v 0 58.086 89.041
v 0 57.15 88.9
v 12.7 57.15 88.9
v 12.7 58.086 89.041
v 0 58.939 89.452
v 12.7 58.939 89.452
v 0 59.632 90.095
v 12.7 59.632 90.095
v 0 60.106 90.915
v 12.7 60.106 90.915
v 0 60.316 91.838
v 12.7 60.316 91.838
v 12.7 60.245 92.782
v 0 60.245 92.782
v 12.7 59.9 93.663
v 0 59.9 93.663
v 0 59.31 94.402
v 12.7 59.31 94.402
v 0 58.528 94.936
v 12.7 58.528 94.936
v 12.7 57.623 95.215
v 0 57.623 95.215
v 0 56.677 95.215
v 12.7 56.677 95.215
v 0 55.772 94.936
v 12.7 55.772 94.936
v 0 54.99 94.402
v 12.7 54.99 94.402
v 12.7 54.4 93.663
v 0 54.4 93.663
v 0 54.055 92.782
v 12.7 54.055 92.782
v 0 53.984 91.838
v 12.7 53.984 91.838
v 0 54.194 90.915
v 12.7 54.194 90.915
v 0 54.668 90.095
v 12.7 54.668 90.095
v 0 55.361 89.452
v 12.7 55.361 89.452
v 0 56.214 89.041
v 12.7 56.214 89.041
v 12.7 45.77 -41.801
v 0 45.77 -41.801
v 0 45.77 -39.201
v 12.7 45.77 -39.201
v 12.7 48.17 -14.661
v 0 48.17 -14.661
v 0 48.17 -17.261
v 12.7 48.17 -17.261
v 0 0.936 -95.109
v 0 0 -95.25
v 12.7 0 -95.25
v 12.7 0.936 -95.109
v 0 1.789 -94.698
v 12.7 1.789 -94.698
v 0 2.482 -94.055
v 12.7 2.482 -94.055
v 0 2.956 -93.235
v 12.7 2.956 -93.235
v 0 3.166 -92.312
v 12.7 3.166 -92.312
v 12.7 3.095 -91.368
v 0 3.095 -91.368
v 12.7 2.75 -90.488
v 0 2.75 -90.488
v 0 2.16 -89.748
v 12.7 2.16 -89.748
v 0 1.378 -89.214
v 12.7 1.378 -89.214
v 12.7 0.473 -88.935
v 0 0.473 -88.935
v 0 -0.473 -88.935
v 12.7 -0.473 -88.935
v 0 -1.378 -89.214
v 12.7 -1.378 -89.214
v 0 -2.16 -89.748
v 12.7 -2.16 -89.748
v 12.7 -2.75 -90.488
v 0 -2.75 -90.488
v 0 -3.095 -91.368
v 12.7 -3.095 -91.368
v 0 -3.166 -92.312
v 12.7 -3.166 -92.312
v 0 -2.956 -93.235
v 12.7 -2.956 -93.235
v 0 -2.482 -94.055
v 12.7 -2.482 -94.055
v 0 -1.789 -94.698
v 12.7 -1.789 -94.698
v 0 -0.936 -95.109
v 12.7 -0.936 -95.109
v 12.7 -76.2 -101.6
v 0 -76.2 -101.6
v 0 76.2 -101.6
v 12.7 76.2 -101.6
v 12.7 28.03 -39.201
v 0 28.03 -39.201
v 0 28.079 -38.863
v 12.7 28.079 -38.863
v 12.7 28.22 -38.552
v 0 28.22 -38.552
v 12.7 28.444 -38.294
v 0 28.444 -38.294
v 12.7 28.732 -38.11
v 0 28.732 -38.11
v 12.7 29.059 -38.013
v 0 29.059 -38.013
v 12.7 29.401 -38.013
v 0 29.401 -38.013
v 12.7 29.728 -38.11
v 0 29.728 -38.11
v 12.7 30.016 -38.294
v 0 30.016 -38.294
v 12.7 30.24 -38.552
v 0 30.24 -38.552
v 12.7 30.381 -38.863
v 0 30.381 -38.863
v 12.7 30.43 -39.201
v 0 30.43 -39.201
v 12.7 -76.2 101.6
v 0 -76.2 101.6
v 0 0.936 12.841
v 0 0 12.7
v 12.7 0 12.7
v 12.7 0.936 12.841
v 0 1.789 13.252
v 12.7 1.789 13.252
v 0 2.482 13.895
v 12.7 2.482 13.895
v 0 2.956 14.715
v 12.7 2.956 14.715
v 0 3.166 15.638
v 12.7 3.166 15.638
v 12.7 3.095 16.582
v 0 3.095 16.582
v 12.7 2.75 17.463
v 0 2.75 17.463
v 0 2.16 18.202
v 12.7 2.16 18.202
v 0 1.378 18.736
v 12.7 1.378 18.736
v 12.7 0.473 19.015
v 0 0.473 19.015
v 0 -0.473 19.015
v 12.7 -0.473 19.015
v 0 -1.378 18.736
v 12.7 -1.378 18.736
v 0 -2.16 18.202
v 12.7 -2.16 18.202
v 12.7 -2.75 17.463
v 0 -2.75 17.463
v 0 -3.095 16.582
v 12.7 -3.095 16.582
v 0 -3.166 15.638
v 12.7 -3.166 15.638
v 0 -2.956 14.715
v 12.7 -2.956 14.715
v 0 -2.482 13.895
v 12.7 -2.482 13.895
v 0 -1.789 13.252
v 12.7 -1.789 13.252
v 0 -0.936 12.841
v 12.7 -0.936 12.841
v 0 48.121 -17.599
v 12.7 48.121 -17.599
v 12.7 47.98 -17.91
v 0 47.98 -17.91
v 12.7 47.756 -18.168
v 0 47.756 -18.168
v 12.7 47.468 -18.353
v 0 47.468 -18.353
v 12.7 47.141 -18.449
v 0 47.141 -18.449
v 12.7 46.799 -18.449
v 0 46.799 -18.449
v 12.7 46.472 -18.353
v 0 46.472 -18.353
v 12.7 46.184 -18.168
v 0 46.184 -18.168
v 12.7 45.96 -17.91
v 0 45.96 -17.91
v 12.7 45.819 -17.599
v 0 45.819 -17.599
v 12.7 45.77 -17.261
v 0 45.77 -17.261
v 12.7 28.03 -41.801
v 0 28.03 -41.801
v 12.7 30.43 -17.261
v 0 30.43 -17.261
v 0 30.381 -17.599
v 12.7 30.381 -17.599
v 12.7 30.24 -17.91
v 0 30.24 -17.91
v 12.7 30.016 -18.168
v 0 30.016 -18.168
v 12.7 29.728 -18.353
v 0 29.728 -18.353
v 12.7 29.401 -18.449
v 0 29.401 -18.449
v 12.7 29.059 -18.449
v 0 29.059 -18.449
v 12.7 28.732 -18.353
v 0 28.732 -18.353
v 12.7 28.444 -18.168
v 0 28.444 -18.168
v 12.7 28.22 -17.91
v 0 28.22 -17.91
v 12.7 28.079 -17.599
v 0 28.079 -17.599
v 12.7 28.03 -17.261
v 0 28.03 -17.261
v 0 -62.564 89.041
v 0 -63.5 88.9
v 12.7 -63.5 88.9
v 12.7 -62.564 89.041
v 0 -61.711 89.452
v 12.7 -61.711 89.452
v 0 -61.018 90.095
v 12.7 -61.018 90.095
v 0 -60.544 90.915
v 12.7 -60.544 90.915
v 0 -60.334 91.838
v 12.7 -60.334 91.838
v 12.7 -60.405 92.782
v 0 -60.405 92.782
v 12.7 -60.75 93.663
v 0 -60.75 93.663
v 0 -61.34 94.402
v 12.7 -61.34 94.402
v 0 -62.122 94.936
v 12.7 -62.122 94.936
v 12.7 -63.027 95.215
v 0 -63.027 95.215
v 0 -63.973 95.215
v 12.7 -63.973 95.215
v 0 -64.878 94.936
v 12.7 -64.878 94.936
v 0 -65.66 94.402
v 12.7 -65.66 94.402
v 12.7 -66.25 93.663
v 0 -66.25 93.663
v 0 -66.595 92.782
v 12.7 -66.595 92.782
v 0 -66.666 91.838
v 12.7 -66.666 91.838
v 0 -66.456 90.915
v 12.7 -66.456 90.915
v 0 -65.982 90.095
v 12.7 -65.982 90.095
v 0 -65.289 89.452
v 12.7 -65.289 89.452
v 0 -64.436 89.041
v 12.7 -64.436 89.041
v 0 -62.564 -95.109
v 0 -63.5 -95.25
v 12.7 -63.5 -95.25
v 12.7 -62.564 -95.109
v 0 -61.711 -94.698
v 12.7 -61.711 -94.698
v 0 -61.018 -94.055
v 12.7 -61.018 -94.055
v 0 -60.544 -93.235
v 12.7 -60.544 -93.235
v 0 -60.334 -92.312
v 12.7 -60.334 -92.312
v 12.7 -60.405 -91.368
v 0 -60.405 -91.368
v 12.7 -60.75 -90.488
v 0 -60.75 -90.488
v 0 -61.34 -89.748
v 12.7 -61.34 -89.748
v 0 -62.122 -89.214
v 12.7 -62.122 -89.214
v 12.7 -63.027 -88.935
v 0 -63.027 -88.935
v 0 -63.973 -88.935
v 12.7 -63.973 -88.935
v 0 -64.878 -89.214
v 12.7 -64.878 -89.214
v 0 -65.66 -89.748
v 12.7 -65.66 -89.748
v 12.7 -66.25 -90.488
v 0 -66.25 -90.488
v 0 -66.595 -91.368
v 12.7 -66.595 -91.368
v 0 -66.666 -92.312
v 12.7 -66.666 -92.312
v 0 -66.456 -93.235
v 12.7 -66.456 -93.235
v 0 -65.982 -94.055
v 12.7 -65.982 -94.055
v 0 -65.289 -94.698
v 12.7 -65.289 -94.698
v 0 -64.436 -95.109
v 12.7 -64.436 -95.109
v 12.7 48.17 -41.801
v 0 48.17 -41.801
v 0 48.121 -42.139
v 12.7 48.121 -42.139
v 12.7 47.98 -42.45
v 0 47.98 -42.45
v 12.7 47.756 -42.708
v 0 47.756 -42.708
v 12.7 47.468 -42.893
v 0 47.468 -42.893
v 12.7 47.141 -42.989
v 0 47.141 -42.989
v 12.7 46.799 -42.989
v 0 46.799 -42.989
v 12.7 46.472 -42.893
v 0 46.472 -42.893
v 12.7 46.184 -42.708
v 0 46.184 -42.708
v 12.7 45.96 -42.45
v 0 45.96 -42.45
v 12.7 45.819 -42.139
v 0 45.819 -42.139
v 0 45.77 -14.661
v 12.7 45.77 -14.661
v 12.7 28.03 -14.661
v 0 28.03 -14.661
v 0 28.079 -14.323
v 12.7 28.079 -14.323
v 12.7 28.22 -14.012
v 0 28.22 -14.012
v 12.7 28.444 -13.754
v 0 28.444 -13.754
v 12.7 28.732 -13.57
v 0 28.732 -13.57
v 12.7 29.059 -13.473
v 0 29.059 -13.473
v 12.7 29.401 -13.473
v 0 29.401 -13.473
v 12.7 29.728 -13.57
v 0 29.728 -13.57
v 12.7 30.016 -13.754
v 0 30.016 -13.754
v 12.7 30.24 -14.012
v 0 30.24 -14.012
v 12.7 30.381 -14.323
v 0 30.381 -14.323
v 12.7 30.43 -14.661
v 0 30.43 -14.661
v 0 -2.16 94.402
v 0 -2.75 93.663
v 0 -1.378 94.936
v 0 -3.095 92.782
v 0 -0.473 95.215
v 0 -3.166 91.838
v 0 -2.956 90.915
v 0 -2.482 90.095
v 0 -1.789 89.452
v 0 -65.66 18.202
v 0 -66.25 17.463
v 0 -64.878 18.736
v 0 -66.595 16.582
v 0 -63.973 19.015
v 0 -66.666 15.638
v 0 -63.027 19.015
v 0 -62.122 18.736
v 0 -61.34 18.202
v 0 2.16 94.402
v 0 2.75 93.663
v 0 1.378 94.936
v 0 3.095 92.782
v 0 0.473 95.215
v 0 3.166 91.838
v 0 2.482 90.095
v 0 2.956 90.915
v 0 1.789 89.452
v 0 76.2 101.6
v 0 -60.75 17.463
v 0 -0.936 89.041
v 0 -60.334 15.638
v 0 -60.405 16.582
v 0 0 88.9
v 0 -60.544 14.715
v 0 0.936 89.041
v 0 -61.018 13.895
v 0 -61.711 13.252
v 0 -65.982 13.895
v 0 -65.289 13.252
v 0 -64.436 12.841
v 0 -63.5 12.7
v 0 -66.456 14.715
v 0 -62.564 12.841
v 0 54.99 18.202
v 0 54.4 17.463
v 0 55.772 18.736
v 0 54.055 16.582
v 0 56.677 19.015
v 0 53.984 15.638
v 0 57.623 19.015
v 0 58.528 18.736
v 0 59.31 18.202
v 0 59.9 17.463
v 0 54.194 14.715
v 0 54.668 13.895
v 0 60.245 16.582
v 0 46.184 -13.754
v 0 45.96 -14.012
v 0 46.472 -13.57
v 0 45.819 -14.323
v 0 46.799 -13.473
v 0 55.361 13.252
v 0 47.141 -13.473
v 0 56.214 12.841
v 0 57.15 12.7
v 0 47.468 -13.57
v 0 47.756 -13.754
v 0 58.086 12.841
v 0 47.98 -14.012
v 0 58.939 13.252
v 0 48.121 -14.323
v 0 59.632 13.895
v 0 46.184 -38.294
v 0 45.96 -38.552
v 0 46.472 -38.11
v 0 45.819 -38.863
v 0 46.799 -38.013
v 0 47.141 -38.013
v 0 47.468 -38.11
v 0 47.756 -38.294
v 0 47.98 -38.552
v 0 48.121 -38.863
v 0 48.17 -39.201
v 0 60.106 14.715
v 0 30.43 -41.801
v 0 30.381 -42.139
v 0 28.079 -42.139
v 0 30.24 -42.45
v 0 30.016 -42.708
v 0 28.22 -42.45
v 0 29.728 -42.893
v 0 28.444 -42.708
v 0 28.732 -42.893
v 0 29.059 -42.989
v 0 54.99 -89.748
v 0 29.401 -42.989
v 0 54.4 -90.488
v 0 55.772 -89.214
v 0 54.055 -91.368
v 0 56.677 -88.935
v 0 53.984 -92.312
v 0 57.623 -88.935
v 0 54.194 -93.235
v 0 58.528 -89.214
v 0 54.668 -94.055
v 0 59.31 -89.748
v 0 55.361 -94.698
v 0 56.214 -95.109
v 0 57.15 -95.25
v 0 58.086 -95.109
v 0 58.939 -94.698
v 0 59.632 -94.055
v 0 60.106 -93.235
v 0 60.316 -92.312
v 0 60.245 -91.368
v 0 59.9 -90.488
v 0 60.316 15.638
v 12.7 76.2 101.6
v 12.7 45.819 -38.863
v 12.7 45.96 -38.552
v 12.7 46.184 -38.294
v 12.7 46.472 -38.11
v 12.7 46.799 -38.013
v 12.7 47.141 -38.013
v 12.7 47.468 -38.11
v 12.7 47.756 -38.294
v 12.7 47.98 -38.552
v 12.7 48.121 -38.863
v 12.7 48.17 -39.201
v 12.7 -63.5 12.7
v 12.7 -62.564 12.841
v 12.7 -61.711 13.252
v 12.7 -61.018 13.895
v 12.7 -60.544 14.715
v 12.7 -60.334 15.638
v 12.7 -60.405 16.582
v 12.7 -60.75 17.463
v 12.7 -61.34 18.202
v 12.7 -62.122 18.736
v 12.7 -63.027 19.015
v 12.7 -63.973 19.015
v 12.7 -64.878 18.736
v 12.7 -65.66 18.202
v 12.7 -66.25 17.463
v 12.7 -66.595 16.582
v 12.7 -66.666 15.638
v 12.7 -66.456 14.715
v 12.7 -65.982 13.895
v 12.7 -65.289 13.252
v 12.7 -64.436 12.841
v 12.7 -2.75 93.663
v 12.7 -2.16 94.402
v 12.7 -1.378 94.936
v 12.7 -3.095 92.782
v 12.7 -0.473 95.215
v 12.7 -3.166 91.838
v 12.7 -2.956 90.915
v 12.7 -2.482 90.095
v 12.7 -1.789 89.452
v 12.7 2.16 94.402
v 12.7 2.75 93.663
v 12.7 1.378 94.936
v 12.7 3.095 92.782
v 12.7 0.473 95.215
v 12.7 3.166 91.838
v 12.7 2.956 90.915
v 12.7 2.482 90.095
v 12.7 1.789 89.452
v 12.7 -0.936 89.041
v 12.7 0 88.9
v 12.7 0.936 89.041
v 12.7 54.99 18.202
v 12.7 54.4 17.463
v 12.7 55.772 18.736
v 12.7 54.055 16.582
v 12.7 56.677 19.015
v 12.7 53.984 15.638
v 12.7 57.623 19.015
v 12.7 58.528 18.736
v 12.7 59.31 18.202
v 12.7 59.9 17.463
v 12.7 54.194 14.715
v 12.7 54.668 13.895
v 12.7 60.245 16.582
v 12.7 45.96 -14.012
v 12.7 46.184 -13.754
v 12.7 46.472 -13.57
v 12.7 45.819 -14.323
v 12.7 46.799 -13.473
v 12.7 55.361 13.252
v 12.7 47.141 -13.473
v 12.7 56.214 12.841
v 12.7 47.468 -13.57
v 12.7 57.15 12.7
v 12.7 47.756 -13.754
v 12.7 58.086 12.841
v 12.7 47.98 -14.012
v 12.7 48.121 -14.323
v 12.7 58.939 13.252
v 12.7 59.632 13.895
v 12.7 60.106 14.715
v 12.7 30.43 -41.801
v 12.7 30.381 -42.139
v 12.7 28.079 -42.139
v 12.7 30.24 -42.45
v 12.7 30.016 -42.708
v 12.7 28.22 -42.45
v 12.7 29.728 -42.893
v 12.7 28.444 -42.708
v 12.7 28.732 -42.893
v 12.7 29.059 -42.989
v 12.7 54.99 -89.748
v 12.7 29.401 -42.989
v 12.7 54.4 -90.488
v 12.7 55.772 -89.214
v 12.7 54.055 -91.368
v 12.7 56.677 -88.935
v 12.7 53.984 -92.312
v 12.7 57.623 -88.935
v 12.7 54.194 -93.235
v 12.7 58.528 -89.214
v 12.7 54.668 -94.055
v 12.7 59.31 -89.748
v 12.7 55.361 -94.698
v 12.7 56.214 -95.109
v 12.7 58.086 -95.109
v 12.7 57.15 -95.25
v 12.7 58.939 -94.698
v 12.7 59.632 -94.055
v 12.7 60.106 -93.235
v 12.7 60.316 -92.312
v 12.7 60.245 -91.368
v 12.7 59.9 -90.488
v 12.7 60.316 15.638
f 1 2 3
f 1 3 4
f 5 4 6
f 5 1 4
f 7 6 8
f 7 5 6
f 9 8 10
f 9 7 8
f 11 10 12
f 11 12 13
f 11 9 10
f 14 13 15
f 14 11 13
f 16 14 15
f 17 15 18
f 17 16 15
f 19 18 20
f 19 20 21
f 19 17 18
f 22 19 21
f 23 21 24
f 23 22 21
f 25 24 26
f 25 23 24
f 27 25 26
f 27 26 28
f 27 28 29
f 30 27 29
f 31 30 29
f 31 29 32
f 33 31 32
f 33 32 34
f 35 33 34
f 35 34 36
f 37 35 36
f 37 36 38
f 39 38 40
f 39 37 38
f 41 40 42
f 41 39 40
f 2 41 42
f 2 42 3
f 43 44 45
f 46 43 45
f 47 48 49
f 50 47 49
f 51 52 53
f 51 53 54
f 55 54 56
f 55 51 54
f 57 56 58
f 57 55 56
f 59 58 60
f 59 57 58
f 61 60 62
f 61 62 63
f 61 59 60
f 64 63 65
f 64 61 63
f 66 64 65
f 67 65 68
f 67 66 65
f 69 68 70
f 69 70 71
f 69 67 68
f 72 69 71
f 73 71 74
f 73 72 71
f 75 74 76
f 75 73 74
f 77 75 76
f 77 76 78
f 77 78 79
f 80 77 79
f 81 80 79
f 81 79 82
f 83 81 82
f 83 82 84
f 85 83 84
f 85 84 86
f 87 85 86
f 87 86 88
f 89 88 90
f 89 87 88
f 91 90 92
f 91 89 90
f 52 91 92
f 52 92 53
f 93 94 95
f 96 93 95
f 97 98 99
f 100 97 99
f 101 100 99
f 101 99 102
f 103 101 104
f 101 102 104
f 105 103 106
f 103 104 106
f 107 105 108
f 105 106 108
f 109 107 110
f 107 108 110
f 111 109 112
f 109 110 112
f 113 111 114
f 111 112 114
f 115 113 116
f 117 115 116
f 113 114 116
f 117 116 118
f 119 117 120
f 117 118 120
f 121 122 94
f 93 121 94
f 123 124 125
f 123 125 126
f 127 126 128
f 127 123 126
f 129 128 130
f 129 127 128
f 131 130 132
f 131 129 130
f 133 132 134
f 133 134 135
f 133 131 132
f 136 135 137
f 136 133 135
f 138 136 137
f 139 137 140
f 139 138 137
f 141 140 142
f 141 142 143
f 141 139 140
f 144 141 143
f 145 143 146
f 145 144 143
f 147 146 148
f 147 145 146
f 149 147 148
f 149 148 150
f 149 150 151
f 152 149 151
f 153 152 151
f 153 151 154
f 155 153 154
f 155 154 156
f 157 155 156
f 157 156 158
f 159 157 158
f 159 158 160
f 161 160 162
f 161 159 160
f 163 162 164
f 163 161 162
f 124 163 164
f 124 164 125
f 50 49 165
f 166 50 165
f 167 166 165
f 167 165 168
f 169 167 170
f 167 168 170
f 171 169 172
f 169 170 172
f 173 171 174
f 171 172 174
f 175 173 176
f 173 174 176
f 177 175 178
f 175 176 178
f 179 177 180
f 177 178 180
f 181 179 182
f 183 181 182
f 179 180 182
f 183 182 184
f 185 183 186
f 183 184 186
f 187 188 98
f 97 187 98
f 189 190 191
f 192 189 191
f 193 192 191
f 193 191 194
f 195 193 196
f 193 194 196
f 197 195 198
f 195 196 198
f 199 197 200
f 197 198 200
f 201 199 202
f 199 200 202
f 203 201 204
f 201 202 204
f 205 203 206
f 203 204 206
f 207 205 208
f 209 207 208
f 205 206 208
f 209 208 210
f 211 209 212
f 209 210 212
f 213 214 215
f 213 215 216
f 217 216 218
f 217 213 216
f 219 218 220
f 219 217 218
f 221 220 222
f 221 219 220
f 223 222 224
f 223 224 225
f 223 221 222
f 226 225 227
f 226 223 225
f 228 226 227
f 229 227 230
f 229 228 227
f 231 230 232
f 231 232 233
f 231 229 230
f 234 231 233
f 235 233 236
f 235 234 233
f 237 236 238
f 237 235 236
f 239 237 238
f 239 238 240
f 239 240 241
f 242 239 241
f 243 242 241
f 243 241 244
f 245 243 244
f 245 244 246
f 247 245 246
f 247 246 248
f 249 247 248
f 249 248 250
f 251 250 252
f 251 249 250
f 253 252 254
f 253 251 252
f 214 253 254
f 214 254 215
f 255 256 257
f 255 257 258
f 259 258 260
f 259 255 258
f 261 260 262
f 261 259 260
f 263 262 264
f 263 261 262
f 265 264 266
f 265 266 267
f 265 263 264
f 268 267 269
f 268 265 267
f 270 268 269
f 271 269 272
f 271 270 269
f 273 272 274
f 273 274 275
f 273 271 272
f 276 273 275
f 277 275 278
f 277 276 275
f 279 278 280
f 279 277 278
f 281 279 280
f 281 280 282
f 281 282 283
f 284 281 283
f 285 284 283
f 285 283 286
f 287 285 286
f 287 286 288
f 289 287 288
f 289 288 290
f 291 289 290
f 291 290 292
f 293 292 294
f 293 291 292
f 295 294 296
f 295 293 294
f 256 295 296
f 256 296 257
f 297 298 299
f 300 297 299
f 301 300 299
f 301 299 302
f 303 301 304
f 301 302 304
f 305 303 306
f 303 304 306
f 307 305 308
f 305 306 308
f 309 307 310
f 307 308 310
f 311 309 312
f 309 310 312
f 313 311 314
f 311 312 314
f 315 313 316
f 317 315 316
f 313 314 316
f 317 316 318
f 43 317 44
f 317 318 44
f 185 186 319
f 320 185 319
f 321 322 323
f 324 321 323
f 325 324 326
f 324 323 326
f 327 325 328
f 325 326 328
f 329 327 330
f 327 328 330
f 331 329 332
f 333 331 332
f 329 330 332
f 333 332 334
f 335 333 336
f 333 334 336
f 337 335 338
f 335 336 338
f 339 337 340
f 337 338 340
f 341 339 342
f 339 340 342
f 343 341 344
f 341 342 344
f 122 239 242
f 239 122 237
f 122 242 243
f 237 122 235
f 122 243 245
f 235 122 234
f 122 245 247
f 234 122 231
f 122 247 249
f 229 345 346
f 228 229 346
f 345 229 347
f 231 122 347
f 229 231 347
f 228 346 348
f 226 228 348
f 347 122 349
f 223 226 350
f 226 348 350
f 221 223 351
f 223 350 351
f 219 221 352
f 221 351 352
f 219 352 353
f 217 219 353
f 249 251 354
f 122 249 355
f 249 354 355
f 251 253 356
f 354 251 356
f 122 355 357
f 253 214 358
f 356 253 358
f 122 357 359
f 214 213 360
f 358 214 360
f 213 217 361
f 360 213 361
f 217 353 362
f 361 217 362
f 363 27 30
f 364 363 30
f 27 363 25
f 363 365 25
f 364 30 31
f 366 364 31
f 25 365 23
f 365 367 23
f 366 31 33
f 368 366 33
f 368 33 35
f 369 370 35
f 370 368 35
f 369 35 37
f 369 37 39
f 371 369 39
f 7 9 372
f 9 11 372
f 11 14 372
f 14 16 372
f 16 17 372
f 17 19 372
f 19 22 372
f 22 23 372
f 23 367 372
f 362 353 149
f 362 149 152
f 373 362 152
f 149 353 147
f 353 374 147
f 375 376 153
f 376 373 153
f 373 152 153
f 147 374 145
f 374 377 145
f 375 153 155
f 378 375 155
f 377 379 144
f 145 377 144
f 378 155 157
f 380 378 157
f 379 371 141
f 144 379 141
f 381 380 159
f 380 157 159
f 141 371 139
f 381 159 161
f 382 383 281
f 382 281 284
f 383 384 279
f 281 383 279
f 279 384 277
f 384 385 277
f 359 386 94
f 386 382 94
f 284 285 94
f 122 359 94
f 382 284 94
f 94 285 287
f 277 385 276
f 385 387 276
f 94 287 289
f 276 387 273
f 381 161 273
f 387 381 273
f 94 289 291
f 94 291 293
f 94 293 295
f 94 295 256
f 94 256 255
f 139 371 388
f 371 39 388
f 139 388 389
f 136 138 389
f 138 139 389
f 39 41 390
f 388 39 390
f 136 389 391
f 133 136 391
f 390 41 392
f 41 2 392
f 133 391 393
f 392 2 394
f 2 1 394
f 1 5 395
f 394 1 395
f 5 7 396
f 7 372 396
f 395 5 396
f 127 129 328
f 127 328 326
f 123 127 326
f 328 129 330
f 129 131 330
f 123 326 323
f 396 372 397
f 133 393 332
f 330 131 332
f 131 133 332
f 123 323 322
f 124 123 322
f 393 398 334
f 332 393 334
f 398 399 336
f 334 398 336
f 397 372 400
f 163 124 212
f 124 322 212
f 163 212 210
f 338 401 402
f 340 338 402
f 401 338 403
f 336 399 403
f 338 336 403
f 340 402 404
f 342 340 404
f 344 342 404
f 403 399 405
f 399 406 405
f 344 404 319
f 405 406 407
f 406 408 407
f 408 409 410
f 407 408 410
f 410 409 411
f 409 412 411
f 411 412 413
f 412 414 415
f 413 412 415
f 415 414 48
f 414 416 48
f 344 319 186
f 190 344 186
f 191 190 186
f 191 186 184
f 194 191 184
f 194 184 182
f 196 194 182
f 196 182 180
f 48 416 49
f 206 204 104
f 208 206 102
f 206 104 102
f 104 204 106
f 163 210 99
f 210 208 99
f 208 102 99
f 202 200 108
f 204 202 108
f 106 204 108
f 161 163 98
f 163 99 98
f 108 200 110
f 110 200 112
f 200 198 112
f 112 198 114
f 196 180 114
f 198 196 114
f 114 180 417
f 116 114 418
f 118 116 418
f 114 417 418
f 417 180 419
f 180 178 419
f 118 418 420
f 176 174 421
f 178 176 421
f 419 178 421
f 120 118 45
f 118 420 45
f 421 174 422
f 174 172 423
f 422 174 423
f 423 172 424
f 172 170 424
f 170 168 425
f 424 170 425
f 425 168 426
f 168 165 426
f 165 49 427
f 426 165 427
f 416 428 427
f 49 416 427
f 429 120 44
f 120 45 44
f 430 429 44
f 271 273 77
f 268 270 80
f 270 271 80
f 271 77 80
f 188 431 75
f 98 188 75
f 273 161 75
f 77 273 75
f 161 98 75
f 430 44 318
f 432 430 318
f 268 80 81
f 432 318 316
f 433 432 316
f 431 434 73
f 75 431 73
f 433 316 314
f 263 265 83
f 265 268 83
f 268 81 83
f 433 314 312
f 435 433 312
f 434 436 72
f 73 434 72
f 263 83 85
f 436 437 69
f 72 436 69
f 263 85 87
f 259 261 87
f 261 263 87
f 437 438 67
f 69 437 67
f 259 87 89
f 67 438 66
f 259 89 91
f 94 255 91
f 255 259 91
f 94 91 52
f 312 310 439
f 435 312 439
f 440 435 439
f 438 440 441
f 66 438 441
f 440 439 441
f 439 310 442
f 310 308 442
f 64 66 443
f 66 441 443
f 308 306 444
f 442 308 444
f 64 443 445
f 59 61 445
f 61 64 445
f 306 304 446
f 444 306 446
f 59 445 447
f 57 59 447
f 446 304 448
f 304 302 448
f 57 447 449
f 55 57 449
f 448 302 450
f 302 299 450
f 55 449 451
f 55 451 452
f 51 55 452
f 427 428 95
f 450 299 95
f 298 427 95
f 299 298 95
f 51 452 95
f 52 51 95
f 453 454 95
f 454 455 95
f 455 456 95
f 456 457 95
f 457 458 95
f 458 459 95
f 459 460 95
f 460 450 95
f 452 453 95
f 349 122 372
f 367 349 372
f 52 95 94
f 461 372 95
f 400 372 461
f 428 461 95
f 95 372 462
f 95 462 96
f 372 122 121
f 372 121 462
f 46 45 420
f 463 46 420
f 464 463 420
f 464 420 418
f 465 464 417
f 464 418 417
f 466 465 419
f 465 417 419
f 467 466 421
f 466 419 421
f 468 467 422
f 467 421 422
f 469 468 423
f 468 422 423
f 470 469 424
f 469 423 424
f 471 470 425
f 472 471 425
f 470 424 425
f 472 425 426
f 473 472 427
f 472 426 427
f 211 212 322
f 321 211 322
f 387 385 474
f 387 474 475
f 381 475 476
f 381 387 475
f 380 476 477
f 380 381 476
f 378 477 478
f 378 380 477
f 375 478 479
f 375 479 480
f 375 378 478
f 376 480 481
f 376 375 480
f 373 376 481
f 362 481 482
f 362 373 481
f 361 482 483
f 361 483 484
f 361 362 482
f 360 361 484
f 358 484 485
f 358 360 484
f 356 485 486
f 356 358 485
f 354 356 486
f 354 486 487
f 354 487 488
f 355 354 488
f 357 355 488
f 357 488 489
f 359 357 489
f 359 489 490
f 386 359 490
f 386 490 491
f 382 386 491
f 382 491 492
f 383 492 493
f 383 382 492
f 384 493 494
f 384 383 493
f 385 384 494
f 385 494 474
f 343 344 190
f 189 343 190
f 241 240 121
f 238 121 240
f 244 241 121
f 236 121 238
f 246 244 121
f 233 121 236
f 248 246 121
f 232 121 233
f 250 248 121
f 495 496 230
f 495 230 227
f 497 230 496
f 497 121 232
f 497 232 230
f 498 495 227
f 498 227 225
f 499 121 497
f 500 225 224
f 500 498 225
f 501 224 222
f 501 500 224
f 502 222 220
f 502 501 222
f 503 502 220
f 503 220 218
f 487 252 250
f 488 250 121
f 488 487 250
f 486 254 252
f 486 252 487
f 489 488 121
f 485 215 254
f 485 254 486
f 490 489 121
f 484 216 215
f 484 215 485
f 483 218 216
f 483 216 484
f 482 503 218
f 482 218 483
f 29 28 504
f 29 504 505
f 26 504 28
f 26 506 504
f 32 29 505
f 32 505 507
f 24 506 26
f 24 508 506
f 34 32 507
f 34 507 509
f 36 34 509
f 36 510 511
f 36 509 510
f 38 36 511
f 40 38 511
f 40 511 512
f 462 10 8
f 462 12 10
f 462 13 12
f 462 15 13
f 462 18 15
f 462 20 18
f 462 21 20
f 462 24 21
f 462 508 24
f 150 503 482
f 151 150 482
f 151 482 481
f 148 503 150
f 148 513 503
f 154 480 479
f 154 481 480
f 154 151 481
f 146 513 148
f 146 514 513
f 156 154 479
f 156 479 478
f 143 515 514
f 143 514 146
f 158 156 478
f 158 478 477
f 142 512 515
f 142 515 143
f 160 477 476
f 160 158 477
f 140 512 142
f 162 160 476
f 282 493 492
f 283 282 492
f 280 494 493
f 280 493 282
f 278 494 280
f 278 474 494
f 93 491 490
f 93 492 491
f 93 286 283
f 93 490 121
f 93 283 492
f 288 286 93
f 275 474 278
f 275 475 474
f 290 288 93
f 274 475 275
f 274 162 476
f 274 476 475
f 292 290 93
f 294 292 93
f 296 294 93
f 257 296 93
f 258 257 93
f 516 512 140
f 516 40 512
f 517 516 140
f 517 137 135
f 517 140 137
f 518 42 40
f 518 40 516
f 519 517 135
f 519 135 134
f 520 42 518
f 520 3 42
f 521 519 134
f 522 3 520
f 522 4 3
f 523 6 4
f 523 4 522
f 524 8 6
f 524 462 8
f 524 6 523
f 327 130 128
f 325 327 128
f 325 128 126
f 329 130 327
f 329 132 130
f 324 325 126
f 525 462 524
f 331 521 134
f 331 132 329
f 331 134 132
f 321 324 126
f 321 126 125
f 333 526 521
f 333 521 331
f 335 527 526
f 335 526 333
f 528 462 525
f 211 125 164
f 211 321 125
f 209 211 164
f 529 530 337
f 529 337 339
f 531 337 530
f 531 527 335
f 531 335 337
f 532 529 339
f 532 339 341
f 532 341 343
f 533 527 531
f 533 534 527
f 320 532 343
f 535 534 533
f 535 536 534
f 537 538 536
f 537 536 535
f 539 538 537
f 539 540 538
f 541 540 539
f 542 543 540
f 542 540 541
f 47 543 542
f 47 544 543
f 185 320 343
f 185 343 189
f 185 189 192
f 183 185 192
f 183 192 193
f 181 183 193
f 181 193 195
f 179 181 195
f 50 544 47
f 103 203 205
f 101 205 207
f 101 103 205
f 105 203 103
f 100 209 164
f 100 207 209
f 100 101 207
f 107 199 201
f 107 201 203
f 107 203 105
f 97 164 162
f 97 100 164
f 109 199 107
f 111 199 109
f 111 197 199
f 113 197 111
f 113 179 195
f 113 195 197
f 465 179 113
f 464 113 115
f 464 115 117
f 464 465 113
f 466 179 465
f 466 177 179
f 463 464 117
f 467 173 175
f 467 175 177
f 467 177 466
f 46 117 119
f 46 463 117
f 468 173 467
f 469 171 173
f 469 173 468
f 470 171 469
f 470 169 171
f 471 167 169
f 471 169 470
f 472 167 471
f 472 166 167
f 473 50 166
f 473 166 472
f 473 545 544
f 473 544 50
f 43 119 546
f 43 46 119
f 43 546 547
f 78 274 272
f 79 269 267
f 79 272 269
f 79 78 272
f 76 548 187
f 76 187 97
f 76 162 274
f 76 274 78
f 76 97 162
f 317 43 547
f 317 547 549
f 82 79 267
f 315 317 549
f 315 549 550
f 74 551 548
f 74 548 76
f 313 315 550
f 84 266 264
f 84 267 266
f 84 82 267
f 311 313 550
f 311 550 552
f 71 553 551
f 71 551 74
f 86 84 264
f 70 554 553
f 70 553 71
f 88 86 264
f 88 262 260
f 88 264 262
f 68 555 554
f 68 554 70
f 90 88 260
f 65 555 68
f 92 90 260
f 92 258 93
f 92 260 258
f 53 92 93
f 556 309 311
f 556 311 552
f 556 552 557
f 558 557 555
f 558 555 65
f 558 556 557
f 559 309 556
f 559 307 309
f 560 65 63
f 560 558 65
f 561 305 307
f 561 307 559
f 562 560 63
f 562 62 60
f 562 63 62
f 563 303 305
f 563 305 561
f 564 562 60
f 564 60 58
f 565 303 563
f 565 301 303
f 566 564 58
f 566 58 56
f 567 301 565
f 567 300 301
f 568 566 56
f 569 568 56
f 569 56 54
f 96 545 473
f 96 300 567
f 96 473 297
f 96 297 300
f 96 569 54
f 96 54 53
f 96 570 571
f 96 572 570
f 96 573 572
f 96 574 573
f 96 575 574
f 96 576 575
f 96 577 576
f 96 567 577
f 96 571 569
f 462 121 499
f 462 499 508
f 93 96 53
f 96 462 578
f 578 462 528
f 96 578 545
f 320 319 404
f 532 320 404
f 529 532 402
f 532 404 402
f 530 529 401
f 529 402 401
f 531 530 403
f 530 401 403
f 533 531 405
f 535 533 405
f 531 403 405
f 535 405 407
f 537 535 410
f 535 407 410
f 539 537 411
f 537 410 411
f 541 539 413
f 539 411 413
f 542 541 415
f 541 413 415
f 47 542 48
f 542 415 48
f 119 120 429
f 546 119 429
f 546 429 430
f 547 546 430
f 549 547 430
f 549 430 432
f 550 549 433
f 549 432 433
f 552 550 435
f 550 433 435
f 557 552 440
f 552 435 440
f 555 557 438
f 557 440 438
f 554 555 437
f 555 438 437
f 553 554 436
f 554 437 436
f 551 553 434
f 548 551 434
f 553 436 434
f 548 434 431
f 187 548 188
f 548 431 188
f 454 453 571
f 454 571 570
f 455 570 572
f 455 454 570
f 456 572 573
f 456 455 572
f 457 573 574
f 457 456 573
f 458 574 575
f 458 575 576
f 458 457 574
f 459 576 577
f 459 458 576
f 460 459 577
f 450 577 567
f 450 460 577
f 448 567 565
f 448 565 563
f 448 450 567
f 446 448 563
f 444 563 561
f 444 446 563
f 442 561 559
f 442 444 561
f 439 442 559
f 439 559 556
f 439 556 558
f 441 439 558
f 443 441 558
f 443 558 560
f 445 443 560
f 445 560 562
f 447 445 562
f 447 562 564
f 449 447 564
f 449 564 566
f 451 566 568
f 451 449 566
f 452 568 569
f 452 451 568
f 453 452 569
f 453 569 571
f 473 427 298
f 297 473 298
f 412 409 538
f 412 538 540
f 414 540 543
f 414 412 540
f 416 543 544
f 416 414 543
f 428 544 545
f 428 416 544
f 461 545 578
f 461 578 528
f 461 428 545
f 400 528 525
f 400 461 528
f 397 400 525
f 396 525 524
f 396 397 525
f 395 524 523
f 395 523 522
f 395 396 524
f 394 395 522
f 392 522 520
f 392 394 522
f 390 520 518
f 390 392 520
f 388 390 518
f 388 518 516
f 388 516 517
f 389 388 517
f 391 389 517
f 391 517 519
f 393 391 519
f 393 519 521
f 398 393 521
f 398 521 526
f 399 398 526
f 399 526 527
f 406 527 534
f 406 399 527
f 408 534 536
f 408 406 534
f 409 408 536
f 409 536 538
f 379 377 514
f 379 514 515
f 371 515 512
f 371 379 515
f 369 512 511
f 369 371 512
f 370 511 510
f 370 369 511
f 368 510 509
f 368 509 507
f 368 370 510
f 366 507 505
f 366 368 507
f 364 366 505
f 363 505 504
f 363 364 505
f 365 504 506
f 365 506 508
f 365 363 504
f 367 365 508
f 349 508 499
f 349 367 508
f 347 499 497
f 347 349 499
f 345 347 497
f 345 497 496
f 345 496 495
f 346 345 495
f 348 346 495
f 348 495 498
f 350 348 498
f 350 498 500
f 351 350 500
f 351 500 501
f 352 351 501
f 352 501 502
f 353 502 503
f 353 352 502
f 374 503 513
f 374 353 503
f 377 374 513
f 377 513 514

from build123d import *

# Parameters (mm, degrees)
SKETCH1_W           = 203.2
SKETCH1_H           = 152.4
SKETCH1_R           = 3.175
BOSS_EXTRUDE1_DEPTH = 12.7


with BuildPart() as part:
    # Sketch1 → Boss-Extrude1 (new body)
    with BuildSketch(Plane(origin=(0, 0, 0), x_dir=(0, 0, -1), z_dir=(1, 0, 0))):
        Rectangle(SKETCH1_W, SKETCH1_H)
        with Locations((-15.875, -63.5)):
            Circle(SKETCH1_R, mode=Mode.SUBTRACT)
        with Locations((-15.875, 0)):
            Circle(SKETCH1_R, mode=Mode.SUBTRACT)
        with Locations((92.075, 0)):
            Circle(SKETCH1_R, mode=Mode.SUBTRACT)
        with Locations((92.075, -63.5)):
            Circle(SKETCH1_R, mode=Mode.SUBTRACT)
        with Locations((-92.075, -63.5)):
            Circle(SKETCH1_R, mode=Mode.SUBTRACT)
        with Locations((-92.075, 0)):
            Circle(SKETCH1_R, mode=Mode.SUBTRACT)
        with Locations((92.075, 57.15)):
            Circle(SKETCH1_R, mode=Mode.SUBTRACT)
        with Locations((-15.875, 57.15)):
            Circle(SKETCH1_R, mode=Mode.SUBTRACT)
        with Locations((-92.075, 57.15)):
            Circle(SKETCH1_R, mode=Mode.SUBTRACT)
        with BuildLine():
            ThreePointArc((17.261210647, 30.43), (18.461210647, 29.23), (17.261210647, 28.03))
            Line((17.261210647, 28.03), (14.661210647, 28.03))
            ThreePointArc((14.661210647, 28.03), (13.461210647, 29.23), (14.661210647, 30.43))
            Line((14.661210647, 30.43), (17.261210647, 30.43))
        make_face(mode=Mode.SUBTRACT)
        with BuildLine():
            Line((41.801210647, 28.03), (39.201210647, 28.03))
            ThreePointArc((39.201210647, 28.03), (38.001210647, 29.23), (39.201210647, 30.43))
            Line((39.201210647, 30.43), (41.801210647, 30.43))
            ThreePointArc((41.801210647, 30.43), (43.001210647, 29.23), (41.801210647, 28.03))
        make_face(mode=Mode.SUBTRACT)
        with BuildLine():
            Line((14.661210647, 48.17), (17.261210647, 48.17))
            ThreePointArc((17.261210647, 48.17), (18.461210647, 46.97), (17.261210647, 45.77))
            Line((17.261210647, 45.77), (14.661210647, 45.77))
            ThreePointArc((14.661210647, 45.77), (13.461210647, 46.97), (14.661210647, 48.17))
        make_face(mode=Mode.SUBTRACT)
        with BuildLine():
            ThreePointArc((41.801210647, 48.17), (43.001210647, 46.97), (41.801210647, 45.77))
            Line((41.801210647, 45.77), (39.201210647, 45.77))
            ThreePointArc((39.201210647, 45.77), (38.001210647, 46.97), (39.201210647, 48.17))
            Line((39.201210647, 48.17), (41.801210647, 48.17))
        make_face(mode=Mode.SUBTRACT)
    extrude(amount=BOSS_EXTRUDE1_DEPTH)


solid = part.part
